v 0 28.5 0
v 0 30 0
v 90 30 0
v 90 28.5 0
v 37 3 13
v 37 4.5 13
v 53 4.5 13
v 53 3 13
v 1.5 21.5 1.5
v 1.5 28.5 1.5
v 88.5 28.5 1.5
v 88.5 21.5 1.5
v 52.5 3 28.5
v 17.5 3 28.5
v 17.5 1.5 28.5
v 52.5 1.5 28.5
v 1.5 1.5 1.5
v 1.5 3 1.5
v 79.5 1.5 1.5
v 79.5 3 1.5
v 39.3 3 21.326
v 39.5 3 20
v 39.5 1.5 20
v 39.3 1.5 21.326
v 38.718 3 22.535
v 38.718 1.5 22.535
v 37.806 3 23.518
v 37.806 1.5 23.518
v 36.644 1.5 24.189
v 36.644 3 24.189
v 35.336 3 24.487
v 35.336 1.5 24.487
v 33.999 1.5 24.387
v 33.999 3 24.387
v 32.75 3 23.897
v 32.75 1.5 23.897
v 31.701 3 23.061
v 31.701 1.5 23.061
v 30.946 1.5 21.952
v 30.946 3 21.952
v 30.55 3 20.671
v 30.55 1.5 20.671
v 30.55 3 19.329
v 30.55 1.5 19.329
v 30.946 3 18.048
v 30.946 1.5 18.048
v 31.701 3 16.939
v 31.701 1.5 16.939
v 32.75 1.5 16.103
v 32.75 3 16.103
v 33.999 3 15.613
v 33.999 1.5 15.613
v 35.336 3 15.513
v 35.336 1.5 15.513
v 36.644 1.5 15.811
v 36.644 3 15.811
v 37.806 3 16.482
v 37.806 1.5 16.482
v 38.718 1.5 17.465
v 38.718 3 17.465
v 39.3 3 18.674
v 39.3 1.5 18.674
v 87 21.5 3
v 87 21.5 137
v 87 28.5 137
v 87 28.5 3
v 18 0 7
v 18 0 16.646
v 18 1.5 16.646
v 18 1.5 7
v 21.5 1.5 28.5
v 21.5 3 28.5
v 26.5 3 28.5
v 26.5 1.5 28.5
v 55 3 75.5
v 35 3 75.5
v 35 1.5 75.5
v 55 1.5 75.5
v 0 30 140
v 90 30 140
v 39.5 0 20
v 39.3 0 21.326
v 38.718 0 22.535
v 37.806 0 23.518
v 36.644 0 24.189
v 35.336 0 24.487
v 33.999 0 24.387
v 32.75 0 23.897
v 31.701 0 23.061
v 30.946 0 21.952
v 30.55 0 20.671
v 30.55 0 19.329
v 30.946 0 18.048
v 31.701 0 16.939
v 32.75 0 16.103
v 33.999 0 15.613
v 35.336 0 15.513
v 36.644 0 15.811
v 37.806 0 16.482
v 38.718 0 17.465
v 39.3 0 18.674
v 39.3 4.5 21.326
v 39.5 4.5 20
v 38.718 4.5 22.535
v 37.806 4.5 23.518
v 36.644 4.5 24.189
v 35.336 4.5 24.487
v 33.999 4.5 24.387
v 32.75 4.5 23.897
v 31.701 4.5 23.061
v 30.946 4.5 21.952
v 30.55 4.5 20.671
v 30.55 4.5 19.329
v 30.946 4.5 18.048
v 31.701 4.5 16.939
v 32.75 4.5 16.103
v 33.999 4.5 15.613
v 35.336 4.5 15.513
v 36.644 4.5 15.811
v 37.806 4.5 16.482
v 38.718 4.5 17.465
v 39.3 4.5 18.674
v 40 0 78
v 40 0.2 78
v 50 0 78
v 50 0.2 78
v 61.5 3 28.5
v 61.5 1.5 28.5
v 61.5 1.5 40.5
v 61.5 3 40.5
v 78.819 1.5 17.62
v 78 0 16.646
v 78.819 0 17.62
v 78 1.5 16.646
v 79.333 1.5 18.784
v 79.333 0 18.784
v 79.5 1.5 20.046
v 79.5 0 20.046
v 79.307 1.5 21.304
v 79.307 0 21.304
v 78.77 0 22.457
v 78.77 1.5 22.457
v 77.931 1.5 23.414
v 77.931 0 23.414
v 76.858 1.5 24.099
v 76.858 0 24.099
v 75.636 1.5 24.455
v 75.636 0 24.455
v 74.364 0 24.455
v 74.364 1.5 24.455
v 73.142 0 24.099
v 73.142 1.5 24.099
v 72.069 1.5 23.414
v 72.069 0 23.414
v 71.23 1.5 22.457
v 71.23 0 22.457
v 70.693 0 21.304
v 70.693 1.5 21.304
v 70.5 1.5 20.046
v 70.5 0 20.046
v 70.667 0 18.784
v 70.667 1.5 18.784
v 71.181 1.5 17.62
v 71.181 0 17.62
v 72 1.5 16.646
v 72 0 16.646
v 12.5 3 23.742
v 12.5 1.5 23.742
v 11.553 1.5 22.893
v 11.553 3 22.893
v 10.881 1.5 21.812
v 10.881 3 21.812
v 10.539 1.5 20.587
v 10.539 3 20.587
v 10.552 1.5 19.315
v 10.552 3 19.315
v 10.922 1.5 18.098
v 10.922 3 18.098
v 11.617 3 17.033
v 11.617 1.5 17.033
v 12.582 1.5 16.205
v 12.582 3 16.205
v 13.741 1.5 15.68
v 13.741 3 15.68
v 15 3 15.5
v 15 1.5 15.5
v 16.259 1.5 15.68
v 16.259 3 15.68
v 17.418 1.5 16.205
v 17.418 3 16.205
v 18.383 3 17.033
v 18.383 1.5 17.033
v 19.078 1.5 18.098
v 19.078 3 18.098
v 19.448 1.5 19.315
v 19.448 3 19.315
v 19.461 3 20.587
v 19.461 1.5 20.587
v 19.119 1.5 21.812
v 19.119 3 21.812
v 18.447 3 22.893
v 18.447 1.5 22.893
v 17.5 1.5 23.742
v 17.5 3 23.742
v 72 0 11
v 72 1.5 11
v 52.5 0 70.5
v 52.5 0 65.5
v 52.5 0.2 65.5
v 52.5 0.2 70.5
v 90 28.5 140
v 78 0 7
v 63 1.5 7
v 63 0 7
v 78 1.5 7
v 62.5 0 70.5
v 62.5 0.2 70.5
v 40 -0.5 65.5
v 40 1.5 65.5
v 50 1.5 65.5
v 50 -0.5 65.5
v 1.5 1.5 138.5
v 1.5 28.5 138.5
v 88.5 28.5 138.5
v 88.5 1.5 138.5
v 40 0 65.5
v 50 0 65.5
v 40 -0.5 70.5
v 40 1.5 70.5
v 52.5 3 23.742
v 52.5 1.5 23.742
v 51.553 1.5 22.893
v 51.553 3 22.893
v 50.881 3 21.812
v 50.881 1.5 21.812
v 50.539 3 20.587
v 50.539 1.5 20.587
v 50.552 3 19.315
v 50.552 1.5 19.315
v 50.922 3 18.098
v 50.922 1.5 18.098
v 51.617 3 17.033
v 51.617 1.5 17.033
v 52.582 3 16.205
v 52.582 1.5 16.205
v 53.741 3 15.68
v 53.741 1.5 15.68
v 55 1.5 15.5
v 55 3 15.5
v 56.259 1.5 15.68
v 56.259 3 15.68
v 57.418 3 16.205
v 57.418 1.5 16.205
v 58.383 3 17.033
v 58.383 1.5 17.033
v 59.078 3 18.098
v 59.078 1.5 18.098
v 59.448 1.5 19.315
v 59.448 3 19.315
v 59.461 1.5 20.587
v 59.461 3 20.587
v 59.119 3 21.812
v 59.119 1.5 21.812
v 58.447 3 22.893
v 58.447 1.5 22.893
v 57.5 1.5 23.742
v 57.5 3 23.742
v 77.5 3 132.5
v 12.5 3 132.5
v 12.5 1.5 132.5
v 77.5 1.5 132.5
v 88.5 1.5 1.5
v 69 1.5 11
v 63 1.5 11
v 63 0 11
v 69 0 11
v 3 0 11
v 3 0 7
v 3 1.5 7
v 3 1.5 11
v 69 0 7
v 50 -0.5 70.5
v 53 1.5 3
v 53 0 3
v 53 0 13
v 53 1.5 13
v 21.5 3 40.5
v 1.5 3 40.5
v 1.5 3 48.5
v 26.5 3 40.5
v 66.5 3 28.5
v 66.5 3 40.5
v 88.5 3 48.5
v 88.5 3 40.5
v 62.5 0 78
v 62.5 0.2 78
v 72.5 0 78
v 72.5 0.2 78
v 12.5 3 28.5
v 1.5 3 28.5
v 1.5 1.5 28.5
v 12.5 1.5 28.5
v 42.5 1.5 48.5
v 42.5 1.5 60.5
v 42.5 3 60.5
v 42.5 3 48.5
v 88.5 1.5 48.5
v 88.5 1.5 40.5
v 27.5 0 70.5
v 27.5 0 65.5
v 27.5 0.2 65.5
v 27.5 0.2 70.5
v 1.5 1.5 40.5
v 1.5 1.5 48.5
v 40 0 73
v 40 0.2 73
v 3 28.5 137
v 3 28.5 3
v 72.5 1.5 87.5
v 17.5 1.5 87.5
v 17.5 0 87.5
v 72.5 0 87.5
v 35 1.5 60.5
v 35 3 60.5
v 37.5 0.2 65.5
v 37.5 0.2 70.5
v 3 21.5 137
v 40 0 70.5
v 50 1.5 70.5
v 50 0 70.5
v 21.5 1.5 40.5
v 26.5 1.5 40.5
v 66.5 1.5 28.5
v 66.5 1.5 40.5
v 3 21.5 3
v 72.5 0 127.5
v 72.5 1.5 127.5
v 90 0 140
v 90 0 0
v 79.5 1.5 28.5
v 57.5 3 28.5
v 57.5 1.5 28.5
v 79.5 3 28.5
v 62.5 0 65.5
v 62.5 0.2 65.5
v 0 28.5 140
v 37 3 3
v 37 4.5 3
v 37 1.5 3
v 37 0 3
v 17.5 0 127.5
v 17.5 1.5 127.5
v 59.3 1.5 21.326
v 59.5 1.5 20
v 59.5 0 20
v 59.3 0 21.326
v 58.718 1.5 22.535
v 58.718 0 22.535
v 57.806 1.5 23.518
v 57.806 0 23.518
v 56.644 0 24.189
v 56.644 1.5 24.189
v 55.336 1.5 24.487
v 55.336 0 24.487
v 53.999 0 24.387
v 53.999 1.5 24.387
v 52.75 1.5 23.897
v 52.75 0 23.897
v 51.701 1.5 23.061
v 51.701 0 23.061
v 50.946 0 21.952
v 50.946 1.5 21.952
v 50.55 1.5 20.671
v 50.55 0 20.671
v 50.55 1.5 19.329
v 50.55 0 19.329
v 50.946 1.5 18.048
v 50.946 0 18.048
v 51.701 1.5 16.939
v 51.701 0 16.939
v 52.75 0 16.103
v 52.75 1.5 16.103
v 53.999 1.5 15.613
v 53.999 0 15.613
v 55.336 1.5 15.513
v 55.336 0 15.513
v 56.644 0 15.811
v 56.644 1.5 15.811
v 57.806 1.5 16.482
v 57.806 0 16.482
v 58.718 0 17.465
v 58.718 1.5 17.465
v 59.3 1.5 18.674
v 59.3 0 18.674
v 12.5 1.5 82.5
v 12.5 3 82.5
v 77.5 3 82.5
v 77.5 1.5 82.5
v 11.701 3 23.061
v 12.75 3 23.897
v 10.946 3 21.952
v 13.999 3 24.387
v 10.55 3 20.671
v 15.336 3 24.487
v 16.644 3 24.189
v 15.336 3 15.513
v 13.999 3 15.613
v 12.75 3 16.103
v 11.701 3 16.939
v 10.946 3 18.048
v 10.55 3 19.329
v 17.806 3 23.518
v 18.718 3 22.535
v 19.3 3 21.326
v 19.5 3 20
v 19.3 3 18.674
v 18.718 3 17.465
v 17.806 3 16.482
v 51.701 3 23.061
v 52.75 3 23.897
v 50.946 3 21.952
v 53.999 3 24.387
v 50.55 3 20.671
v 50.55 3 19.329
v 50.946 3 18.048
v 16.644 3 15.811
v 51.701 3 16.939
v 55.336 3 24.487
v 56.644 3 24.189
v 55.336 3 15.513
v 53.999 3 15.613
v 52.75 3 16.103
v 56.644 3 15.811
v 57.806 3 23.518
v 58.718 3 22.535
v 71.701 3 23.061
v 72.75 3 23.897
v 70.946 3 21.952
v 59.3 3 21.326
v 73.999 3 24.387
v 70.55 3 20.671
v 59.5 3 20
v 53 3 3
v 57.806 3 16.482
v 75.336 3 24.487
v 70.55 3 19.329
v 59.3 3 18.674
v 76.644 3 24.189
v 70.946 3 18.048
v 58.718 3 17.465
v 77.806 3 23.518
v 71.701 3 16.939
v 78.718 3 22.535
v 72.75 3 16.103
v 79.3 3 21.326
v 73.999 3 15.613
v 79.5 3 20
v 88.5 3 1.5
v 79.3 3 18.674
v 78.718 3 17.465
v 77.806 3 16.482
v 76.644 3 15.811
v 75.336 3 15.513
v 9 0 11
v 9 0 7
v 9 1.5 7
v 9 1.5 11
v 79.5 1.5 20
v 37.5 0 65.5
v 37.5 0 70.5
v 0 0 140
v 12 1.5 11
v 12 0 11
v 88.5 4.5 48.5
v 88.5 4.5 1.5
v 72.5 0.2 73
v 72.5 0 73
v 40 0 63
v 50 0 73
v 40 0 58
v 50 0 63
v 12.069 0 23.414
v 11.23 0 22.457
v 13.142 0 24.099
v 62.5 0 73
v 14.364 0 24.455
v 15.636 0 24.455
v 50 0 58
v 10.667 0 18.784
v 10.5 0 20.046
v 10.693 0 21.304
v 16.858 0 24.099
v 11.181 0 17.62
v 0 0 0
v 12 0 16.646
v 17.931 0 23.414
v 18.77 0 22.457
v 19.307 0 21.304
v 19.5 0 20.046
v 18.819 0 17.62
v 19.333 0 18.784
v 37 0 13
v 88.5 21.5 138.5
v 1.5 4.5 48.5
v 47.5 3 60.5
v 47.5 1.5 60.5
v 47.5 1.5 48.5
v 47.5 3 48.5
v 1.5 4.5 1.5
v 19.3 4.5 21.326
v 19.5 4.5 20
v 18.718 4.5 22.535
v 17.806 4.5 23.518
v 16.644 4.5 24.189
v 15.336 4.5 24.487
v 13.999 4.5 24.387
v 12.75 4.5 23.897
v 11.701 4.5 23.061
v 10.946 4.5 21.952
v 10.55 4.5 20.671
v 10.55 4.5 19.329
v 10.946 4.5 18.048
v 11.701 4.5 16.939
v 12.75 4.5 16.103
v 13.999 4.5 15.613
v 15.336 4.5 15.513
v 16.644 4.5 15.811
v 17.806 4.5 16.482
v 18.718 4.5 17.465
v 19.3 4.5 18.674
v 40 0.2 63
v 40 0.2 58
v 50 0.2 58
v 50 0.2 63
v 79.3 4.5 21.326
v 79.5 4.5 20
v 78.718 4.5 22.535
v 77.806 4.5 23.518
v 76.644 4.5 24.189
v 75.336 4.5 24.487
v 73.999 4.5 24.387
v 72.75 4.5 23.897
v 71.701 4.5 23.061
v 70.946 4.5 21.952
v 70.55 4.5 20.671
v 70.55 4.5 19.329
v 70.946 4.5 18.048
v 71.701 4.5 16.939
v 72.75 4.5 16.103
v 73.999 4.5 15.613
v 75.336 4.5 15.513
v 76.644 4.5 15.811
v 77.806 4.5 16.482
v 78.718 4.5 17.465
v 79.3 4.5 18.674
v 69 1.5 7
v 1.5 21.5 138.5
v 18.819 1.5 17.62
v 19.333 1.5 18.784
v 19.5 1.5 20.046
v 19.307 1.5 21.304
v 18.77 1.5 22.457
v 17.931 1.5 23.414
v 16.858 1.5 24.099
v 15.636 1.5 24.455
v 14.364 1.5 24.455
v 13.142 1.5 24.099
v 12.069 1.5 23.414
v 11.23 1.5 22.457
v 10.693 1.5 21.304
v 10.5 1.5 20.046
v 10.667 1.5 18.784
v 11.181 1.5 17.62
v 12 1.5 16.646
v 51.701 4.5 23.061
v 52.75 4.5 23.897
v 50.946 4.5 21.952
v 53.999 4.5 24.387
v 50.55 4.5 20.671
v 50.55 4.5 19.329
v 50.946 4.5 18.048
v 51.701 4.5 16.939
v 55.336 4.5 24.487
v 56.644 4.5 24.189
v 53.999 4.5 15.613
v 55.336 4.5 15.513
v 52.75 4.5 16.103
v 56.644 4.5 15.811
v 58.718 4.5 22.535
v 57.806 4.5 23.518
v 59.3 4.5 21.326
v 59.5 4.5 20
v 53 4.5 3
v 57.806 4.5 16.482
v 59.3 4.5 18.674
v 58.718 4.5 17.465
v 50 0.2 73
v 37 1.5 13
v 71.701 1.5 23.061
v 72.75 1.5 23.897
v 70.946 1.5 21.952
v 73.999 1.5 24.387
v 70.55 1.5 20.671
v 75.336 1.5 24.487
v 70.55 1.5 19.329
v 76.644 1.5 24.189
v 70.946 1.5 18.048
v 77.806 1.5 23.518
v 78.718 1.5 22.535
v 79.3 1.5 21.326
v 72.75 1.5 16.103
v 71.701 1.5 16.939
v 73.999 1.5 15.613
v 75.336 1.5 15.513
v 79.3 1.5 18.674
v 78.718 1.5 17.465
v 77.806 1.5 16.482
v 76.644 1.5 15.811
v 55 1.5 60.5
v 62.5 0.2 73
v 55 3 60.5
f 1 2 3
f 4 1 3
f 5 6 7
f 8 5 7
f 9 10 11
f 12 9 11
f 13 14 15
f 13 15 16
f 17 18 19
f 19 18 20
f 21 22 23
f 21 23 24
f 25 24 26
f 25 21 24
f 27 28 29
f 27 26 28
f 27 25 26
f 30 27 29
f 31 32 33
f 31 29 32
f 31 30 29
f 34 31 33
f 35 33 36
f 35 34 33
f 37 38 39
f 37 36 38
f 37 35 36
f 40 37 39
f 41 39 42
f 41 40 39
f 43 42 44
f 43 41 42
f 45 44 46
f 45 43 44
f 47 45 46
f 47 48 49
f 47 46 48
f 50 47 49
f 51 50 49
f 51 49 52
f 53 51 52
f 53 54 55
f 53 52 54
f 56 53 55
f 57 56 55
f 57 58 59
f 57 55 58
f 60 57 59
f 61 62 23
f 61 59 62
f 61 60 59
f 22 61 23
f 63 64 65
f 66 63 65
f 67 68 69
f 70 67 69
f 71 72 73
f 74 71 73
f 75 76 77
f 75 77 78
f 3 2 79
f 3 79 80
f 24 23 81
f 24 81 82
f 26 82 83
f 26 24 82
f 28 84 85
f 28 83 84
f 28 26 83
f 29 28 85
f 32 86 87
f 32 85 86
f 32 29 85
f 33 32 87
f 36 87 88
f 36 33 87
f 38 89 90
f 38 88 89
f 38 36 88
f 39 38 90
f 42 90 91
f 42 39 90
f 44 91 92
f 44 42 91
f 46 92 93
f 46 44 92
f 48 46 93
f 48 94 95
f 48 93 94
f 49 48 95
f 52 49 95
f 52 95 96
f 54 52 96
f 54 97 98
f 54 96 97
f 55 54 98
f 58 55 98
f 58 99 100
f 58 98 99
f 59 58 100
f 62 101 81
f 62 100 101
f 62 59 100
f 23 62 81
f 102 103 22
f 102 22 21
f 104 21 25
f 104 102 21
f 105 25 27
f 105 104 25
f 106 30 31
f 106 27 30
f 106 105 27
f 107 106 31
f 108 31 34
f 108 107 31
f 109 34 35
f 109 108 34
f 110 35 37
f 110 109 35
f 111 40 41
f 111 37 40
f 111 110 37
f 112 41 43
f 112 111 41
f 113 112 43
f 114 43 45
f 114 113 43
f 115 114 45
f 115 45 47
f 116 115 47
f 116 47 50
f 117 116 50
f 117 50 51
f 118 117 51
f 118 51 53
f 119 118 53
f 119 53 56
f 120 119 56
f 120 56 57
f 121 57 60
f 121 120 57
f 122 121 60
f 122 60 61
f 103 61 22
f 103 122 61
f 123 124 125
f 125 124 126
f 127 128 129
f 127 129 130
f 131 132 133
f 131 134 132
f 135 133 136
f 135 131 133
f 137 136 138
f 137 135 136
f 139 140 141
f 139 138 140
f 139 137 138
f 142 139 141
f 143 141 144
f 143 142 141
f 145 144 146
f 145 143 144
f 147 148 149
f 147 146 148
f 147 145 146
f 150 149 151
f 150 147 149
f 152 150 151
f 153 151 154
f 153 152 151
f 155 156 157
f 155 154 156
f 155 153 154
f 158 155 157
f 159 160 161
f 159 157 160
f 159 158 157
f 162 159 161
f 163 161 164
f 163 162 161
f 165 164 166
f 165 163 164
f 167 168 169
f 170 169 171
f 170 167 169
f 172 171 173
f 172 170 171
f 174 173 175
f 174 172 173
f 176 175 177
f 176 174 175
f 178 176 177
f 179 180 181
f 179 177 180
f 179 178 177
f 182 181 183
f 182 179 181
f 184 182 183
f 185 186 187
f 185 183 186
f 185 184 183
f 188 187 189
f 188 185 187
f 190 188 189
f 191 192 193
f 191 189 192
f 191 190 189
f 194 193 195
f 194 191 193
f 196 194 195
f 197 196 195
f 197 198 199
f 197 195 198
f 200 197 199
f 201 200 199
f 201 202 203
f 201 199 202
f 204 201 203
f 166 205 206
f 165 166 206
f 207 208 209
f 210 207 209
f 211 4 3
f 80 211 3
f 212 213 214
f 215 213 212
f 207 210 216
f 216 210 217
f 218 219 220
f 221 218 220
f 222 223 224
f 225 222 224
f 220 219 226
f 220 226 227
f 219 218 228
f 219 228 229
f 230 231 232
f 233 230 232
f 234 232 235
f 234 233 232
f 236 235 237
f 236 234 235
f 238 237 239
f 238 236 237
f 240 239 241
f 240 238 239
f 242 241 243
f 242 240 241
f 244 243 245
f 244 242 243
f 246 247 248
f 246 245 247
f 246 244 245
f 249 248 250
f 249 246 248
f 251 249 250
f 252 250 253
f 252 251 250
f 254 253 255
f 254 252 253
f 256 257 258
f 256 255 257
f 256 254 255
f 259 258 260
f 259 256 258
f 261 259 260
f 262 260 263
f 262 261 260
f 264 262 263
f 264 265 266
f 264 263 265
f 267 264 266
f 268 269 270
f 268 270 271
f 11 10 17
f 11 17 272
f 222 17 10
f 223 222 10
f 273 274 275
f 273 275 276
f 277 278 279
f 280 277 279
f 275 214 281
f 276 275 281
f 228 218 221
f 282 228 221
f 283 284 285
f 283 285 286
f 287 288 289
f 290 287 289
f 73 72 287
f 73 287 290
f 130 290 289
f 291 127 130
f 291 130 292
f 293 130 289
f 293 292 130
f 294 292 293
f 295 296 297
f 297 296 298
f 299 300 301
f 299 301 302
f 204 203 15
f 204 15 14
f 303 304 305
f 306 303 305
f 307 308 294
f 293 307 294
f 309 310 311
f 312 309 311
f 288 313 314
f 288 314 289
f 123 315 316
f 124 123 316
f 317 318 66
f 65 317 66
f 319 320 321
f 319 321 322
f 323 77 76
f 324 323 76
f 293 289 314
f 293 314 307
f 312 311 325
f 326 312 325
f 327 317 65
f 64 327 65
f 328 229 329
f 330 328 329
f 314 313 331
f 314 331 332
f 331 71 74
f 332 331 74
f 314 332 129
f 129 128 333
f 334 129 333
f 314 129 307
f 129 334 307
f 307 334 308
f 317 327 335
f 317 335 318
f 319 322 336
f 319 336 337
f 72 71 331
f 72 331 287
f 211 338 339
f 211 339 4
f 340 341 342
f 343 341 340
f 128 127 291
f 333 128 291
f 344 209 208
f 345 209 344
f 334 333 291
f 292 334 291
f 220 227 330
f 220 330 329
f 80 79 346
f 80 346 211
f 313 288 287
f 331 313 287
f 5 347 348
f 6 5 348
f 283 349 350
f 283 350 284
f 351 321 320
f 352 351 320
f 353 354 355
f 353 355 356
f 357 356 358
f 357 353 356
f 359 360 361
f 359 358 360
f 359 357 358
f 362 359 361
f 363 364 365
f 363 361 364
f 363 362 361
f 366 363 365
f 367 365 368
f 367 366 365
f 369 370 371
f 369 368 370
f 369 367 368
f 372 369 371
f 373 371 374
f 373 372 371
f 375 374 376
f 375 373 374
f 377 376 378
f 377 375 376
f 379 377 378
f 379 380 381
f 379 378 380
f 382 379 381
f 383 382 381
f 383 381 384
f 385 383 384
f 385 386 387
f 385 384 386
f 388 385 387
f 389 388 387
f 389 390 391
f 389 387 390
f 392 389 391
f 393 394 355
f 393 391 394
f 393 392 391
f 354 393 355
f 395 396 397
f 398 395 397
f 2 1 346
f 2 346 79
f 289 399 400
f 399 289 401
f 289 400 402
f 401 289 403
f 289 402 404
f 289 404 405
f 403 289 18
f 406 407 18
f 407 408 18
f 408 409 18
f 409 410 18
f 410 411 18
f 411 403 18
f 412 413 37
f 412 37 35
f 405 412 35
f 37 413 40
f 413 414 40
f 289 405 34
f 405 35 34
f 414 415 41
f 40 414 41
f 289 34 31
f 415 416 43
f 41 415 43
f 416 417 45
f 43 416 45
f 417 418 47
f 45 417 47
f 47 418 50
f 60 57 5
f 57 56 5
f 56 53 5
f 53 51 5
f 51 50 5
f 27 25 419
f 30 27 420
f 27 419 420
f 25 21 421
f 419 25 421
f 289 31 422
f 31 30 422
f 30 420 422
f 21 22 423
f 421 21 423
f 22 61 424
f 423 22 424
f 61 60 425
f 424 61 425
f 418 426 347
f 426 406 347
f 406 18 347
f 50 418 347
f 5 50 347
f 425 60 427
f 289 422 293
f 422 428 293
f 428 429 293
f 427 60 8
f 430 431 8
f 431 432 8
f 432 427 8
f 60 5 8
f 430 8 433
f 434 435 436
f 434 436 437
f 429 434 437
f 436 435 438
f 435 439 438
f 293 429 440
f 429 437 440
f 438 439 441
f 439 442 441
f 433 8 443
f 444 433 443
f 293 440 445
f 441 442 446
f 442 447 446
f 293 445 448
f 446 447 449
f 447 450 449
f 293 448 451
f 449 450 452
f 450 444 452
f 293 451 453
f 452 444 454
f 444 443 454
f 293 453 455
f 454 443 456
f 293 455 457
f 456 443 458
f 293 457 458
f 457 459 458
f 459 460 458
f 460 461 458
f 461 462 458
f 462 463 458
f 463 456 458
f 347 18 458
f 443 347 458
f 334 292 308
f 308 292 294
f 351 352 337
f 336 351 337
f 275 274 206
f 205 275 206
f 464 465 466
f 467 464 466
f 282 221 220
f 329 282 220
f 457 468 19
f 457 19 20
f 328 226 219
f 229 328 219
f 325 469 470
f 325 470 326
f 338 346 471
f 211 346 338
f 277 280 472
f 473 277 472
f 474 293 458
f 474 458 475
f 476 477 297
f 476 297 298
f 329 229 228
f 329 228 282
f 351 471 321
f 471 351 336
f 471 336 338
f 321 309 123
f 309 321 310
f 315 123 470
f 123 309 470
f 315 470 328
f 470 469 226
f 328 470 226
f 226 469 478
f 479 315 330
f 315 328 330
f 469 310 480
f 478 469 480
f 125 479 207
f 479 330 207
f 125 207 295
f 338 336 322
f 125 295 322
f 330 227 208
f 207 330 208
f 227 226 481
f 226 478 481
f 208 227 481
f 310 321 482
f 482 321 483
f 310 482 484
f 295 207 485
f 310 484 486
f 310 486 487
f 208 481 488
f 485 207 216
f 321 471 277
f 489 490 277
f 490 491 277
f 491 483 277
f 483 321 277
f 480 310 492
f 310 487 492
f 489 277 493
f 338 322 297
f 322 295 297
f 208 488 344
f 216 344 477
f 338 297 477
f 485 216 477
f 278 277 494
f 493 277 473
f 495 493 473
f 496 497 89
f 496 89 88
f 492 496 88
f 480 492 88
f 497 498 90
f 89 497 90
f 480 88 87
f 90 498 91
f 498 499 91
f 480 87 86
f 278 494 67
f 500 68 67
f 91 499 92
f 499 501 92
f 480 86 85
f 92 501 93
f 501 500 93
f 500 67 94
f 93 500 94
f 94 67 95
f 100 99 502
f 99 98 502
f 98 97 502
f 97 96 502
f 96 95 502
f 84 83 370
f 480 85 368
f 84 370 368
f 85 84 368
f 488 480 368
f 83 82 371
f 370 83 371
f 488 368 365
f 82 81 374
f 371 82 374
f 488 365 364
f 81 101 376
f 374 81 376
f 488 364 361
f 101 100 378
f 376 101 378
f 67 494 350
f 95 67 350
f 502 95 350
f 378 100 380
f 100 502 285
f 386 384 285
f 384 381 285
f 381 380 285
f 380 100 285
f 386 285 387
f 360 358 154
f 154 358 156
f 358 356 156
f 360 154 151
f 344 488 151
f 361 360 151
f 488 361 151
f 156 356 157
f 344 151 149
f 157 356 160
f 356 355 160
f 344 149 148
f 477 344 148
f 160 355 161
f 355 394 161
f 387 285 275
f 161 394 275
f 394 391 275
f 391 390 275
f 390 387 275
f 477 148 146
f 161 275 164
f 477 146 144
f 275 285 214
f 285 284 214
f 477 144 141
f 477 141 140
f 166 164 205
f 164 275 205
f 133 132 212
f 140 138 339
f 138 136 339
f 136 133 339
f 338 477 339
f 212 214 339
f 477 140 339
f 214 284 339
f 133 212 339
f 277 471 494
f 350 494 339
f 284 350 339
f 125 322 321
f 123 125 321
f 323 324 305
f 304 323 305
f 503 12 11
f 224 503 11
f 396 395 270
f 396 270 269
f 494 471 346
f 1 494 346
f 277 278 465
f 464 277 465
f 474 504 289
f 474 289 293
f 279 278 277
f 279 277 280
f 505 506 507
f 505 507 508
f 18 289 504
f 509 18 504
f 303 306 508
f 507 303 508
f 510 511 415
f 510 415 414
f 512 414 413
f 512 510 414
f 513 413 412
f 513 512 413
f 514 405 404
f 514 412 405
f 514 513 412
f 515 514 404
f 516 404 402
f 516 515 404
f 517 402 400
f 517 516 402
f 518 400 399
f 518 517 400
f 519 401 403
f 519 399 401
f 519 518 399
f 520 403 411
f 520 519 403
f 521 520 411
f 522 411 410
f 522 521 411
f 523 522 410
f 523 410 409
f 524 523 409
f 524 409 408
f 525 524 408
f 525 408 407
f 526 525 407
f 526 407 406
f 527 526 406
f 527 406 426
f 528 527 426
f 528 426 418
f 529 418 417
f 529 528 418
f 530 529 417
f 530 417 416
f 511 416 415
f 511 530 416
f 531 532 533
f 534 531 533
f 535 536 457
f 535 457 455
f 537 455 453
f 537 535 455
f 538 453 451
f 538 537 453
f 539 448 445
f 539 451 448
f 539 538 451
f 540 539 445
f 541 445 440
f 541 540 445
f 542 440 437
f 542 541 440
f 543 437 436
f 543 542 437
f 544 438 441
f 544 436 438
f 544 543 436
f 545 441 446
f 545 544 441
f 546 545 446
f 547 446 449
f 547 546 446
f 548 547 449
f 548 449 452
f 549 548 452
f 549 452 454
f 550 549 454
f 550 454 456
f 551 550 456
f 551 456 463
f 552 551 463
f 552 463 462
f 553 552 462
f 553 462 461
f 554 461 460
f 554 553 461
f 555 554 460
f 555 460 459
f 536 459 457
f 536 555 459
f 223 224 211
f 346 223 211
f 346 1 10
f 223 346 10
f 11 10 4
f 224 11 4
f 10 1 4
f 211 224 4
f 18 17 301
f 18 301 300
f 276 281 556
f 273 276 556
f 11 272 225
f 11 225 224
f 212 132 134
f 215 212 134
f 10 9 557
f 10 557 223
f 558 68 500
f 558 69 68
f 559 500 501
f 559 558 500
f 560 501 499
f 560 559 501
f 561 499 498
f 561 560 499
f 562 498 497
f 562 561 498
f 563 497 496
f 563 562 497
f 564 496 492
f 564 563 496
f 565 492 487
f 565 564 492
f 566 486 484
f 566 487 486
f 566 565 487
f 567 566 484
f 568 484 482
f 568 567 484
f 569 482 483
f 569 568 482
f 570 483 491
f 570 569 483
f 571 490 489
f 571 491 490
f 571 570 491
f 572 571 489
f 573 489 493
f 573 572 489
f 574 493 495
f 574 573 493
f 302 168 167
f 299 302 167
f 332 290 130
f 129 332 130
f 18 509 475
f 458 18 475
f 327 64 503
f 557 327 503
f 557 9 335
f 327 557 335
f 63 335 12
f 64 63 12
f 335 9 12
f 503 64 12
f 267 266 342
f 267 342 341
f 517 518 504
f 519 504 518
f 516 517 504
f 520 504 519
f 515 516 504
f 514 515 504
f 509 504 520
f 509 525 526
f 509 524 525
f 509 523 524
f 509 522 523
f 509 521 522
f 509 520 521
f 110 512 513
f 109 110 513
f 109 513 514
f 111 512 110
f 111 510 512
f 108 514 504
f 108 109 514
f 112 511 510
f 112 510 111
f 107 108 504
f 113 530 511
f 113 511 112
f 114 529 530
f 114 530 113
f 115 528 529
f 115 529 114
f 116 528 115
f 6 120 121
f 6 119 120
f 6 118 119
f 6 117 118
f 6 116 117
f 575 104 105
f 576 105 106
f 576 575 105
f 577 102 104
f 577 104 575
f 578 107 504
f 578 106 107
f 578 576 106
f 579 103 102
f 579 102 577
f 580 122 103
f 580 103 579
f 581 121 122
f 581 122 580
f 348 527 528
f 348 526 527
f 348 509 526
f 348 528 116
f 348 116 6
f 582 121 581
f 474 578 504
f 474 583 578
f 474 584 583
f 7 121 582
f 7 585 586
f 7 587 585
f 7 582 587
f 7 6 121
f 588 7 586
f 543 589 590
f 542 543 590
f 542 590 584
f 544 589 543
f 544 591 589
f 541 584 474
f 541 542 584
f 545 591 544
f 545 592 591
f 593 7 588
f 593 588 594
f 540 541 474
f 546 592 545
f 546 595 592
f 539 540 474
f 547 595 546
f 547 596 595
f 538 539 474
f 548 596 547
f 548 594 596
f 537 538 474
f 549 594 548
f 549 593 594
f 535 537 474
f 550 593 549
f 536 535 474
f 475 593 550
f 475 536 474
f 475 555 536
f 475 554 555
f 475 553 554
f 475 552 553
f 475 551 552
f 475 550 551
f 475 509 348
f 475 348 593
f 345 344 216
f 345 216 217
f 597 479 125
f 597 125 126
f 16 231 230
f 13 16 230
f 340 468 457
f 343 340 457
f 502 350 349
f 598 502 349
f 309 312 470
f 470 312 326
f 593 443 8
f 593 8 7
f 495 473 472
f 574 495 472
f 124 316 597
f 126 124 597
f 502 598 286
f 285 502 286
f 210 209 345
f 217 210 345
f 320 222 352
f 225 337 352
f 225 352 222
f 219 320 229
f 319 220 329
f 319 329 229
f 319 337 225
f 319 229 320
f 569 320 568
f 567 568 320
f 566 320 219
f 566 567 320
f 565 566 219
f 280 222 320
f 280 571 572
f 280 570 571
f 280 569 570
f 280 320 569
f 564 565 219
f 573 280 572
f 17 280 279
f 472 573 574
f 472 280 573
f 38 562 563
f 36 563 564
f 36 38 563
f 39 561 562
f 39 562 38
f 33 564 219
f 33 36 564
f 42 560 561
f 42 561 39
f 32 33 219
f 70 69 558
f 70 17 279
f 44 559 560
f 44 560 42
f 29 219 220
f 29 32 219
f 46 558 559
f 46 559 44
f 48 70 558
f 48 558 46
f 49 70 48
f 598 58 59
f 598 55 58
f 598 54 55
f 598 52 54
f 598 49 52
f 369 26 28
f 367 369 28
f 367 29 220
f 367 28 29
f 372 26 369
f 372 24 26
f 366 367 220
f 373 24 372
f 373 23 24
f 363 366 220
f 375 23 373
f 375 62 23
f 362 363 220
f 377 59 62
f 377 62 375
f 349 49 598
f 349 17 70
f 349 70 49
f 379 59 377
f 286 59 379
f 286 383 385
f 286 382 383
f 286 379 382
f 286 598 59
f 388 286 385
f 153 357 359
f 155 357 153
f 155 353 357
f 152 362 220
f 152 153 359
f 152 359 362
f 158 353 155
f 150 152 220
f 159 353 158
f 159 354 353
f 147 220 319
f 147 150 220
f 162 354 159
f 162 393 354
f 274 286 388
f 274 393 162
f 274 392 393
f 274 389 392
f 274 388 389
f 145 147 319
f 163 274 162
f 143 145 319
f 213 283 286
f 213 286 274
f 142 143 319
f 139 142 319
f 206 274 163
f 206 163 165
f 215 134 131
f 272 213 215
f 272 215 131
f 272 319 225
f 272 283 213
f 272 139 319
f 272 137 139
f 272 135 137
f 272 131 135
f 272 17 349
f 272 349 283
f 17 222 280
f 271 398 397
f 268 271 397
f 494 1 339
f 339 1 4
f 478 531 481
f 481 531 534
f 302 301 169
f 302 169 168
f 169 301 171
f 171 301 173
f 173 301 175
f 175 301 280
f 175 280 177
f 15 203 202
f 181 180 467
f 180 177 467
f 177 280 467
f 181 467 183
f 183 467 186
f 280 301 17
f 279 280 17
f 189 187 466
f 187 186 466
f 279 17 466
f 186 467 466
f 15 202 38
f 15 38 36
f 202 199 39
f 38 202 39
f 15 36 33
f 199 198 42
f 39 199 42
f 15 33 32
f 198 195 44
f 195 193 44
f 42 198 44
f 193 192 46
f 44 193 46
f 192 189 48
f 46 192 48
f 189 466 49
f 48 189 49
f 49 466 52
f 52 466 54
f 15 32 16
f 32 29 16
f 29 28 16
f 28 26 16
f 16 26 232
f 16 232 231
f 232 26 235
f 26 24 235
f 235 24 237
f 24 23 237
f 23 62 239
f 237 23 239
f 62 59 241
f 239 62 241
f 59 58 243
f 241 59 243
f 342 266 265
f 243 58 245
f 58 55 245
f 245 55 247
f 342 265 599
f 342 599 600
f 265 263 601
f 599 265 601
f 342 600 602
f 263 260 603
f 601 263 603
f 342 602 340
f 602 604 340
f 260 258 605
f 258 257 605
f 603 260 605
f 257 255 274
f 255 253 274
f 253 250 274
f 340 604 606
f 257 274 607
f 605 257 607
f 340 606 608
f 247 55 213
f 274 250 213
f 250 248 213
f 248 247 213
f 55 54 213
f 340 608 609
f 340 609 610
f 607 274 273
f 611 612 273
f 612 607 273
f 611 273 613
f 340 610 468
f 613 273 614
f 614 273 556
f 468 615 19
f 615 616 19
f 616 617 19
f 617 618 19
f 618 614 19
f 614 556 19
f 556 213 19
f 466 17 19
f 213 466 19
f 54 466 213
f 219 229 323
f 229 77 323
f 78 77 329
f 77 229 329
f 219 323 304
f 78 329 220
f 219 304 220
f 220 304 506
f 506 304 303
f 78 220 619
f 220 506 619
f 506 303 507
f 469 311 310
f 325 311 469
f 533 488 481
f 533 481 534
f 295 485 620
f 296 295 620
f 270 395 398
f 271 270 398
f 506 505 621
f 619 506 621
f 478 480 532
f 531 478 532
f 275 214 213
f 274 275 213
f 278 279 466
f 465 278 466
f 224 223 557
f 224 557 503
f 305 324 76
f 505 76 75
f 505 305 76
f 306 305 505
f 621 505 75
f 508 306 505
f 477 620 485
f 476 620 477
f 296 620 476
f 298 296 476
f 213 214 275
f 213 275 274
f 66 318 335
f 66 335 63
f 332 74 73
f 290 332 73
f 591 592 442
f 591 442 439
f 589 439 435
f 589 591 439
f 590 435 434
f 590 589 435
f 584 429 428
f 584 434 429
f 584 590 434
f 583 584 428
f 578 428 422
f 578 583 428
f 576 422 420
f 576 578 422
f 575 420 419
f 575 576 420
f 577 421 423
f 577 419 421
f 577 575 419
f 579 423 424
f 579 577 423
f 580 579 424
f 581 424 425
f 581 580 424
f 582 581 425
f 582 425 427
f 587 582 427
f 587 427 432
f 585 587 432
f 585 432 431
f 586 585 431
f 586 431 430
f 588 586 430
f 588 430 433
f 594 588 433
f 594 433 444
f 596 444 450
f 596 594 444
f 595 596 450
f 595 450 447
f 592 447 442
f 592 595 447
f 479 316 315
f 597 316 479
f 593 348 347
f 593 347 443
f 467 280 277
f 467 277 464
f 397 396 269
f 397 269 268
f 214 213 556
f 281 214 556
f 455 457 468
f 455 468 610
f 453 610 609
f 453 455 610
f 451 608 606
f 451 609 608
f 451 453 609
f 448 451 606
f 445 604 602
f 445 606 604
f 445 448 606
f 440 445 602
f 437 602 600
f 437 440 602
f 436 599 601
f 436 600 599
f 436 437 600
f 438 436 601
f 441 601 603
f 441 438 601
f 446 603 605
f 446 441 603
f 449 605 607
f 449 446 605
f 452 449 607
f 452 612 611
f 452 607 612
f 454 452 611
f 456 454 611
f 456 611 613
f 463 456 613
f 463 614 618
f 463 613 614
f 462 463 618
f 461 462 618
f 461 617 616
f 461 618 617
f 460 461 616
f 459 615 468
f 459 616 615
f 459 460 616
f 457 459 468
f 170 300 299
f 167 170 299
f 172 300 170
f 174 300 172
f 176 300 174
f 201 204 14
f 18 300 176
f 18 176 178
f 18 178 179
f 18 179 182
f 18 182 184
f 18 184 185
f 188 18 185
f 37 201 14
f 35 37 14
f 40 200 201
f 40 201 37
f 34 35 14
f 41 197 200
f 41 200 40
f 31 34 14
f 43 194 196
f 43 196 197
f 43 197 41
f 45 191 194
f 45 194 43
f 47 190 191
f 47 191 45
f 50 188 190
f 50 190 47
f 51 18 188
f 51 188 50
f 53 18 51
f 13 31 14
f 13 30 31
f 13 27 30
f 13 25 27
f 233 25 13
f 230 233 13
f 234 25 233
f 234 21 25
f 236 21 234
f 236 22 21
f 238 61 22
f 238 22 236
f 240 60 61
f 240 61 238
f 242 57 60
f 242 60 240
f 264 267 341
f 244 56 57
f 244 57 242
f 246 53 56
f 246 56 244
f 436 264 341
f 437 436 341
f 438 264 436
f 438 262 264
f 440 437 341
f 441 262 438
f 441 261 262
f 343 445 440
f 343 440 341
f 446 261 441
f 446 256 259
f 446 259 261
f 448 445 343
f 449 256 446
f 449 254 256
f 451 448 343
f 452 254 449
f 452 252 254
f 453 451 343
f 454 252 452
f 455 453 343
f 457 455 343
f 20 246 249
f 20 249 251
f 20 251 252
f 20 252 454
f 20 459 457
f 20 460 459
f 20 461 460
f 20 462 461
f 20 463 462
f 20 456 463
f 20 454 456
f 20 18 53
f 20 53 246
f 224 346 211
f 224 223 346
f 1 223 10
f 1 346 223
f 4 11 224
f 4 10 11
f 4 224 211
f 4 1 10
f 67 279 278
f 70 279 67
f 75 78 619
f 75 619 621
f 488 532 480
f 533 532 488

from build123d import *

# Parameters (mm, degrees)
BOX011_W               = 65
BOX011_H               = 1.5
BOX011_DEPTH           = 50
BOX008_W               = 1.5
BOX008_H               = 7
BOX008_DEPTH           = 137
BOX007_W               = 90
BOX007_H               = 1.5
BOX007_DEPTH           = 140
BOX009_W               = 84
BOX009_H               = 7
BOX009_DEPTH           = 1.5
BOX006_W               = 1.5
BOX006_H               = 7
BOX006_DEPTH           = 137
BOX005_W               = 84
BOX005_H               = 7
BOX005_DEPTH           = 1.5
CYLINDER008_R          = 4.5
CYLINDER008_DEPTH      = 10
CYLINDER008_ROLL_ANGLE = 90
CYLINDER010_R          = 4.5
CYLINDER010_DEPTH      = 10
CYLINDER010_ROLL_ANGLE = 90
CYLINDER009_R          = 4.5
CYLINDER009_DEPTH      = 10
CYLINDER009_ROLL_ANGLE = 90
CYLINDER011_R          = 4.5
CYLINDER011_DEPTH      = 10
CYLINDER011_ROLL_ANGLE = 90
BOX023_W               = 16
BOX023_H               = 10
BOX023_DEPTH           = 10
BOX021_W               = 87
BOX021_H               = 1.5
BOX021_DEPTH           = 47
BOX028_W               = 6
BOX028_H               = 1.5
BOX028_DEPTH           = 4
BOX031_W               = 6
BOX031_H               = 1.5
BOX031_DEPTH           = 4
BOX027_W               = 5
BOX027_H               = 1.5
BOX027_DEPTH           = 12
BOX025_W               = 5
BOX025_H               = 1.5
BOX025_DEPTH           = 12
CYLINDER002_R          = 4.5
CYLINDER002_DEPTH      = 10
CYLINDER002_ROLL_ANGLE = 90
CYLINDER001_R          = 4.5
CYLINDER001_DEPTH      = 10
CYLINDER001_ROLL_ANGLE = 90
CYLINDER003_R          = 4.5
CYLINDER003_DEPTH      = 10
CYLINDER003_ROLL_ANGLE = 90
CYLINDER_R             = 4.5
CYLINDER_DEPTH         = 10
CYLINDER_ROLL_ANGLE    = 90
BOX012_W               = 78
BOX012_H               = 1.5
BOX012_DEPTH           = 27
BOX041_W               = 5
BOX041_H               = 1.5
BOX041_DEPTH           = 12
BOX040_W               = 20
BOX040_H               = 1.5
BOX040_DEPTH           = 15
BOX039_W               = 10
BOX039_H               = 2
BOX039_DEPTH           = 5
BOX026_W               = 5
BOX026_H               = 1.5
BOX026_DEPTH           = 12
BOX024_W               = 5
BOX024_H               = 1.5
BOX024_DEPTH           = 12
BOX017_W               = 87
BOX017_H               = 1.5
BOX017_DEPTH           = 8
BOX034_W               = 10
BOX034_H               = 0.2
BOX034_DEPTH           = 5
BOX035_W               = 10
BOX035_H               = 0.2
BOX035_DEPTH           = 5
BOX036_W               = 10
BOX036_H               = 0.2
BOX036_DEPTH           = 5
BOX037_W               = 10
BOX037_H               = 0.2
BOX037_DEPTH           = 5
BOX038_W               = 10
BOX038_H               = 1.5
BOX038_DEPTH           = 5
BOX042_W               = 10
BOX042_H               = 0.2
BOX042_DEPTH           = 5
BOX033_W               = 6
BOX033_H               = 1.5
BOX033_DEPTH           = 12
BOX032_W               = 15
BOX032_H               = 1.5
BOX032_DEPTH           = 4
BOX030_W               = 6
BOX030_H               = 1.5
BOX030_DEPTH           = 12
BOX029_W               = 15
BOX029_H               = 1.5
BOX029_DEPTH           = 4
BOX_W                  = 1.5
BOX_H                  = 27
BOX_DEPTH              = 140
BOX002_W               = 87
BOX002_H               = 27
BOX002_DEPTH           = 1.5
BOX001_W               = 1.5
BOX001_H               = 27
BOX001_DEPTH           = 140
CYLINDER004_R          = 4.5
CYLINDER004_DEPTH      = 10
CYLINDER004_ROLL_ANGLE = 90
CYLINDER006_R          = 4.5
CYLINDER006_DEPTH      = 10
CYLINDER006_ROLL_ANGLE = 90
CYLINDER005_R          = 4.5
CYLINDER005_DEPTH      = 10
CYLINDER005_ROLL_ANGLE = 90
CYLINDER007_R          = 4.5
CYLINDER007_DEPTH      = 10
CYLINDER007_ROLL_ANGLE = 90
BOX020_W               = 16
BOX020_H               = 10
BOX020_DEPTH           = 10
BOX019_W               = 55
BOX019_H               = 1.5
BOX019_DEPTH           = 40
BOX018_W               = 90
BOX018_H               = 1.5
BOX018_DEPTH           = 140
BOX004_W               = 87
BOX004_H               = 27
BOX004_DEPTH           = 1.5


with BuildPart() as cube011:
    # Box011 → Box011 (new body)
    with BuildSketch(Plane(origin=(12.5, 1.5, 82.5), x_dir=(1, 0, 0), z_dir=(0, 0, 1))):
        with Locations((32.5, 0.75)):
            Rectangle(BOX011_W, BOX011_H)
    extrude(amount=BOX011_DEPTH)


with BuildPart() as cube008:
    # Box008 → Box008 (new body)
    with BuildSketch(Plane(origin=(87, 21.5, 1.5), x_dir=(1, 0, 0), z_dir=(0, 0, 1))):
        with Locations((0.75, 3.5)):
            Rectangle(BOX008_W, BOX008_H)
    extrude(amount=BOX008_DEPTH)


with BuildPart() as cube007:
    # Box007 → Box007 (new body)
    with BuildSketch(Plane(origin=(0, 28.5, 0), x_dir=(1, 0, 0), z_dir=(0, 0, 1))):
        with Locations((45, 0.75)):
            Rectangle(BOX007_W, BOX007_H)
    extrude(amount=BOX007_DEPTH)


with BuildPart() as cube009:
    # Box009 → Box009 (new body)
    with BuildSketch(Plane(origin=(3, 21.5, 1.5), x_dir=(1, 0, 0), z_dir=(0, 0, 1))):
        with Locations((42, 3.5)):
            Rectangle(BOX009_W, BOX009_H)
    extrude(amount=BOX009_DEPTH)


with BuildPart() as cube006:
    # Box006 → Box006 (new body)
    with BuildSketch(Plane(origin=(1.5, 21.5, 1.5), x_dir=(1, 0, 0), z_dir=(0, 0, 1))):
        with Locations((0.75, 3.5)):
            Rectangle(BOX006_W, BOX006_H)
    extrude(amount=BOX006_DEPTH)


with BuildPart() as fusion001:
    # Box005 → Box005 (new body)
    with BuildSketch(Plane(origin=(3, 21.5, 137), x_dir=(1, 0, 0), z_dir=(0, 0, 1))):
        with Locations((42, 3.5)):
            Rectangle(BOX005_W, BOX005_H)
    extrude(amount=BOX005_DEPTH)

    # Fusion001: union Cube008, Cube007, Cube009, Cube006
    add(cube008.part)
    add(cube007.part)
    add(cube009.part)
    add(cube006.part)


with BuildPart() as cylinder008:
    # Cylinder008 → Cylinder008 (new body)
    with BuildSketch(Plane.XY):
        Circle(CYLINDER008_R)
    extrude(amount=CYLINDER008_DEPTH)


with BuildPart() as cylinder008_1:
    # Cylinder008 roll: moved
    add(cylinder008.part.rotate(Axis((0, 0, 0), (1, 0, 0)), CYLINDER008_ROLL_ANGLE))


with BuildPart() as cylinder008_2:
    # Cylinder008 placement: moved
    add(cylinder008_1.part.moved(Location((15, 5, 20))))


with BuildPart() as cylinder010:
    # Cylinder010 → Cylinder010 (new body)
    with BuildSketch(Plane.XY):
        Circle(CYLINDER010_R)
    extrude(amount=CYLINDER010_DEPTH)


with BuildPart() as cylinder010_1:
    # Cylinder010 roll: moved
    add(cylinder010.part.rotate(Axis((0, 0, 0), (1, 0, 0)), CYLINDER010_ROLL_ANGLE))


with BuildPart() as cylinder010_2:
    # Cylinder010 placement: moved
    add(cylinder010_1.part.moved(Location((35, 5, 20))))


with BuildPart() as cylinder009:
    # Cylinder009 → Cylinder009 (new body)
    with BuildSketch(Plane.XY):
        Circle(CYLINDER009_R)
    extrude(amount=CYLINDER009_DEPTH)


with BuildPart() as cylinder009_1:
    # Cylinder009 roll: moved
    add(cylinder009.part.rotate(Axis((0, 0, 0), (1, 0, 0)), CYLINDER009_ROLL_ANGLE))


with BuildPart() as cylinder009_2:
    # Cylinder009 placement: moved
    add(cylinder009_1.part.moved(Location((55, 5, 20))))


with BuildPart() as cylinder011:
    # Cylinder011 → Cylinder011 (new body)
    with BuildSketch(Plane.XY):
        Circle(CYLINDER011_R)
    extrude(amount=CYLINDER011_DEPTH)


with BuildPart() as cylinder011_1:
    # Cylinder011 roll: moved
    add(cylinder011.part.rotate(Axis((0, 0, 0), (1, 0, 0)), CYLINDER011_ROLL_ANGLE))


with BuildPart() as cylinder011_2:
    # Cylinder011 placement: moved
    add(cylinder011_1.part.moved(Location((75, 5, 20))))


with BuildPart() as fusion004:
    # Box023 → Box023 (new body)
    with BuildSketch(Plane(origin=(37, -5, 3), x_dir=(1, 0, 0), z_dir=(0, 0, 1))):
        with Locations((8, 5)):
            Rectangle(BOX023_W, BOX023_H)
    extrude(amount=BOX023_DEPTH)

    # Fusion004: union Cylinder008, Cylinder010, Cylinder009, Cylinder011
    add(cylinder008_2.part)
    add(cylinder010_2.part)
    add(cylinder009_2.part)
    add(cylinder011_2.part)


with BuildPart() as cut:
    # Box021 → Box021 (new body)
    with BuildSketch(Plane(origin=(1.5, 3, 1.5), x_dir=(1, 0, 0), z_dir=(0, 0, 1))):
        with Locations((43.5, 0.75)):
            Rectangle(BOX021_W, BOX021_H)
    extrude(amount=BOX021_DEPTH)

    # Cut: cut Fusion004
    add(fusion004.part, mode=Mode.SUBTRACT)


with BuildPart() as cube028:
    # Box028 → Box028 (new body)
    with BuildSketch(Plane(origin=(3, 0, 7), x_dir=(1, 0, 0), z_dir=(0, 0, 1))):
        with Locations((3, 0.75)):
            Rectangle(BOX028_W, BOX028_H)
    extrude(amount=BOX028_DEPTH)


with BuildPart() as cube031:
    # Box031 → Box031 (new body)
    with BuildSketch(Plane(origin=(63, 0, 7), x_dir=(1, 0, 0), z_dir=(0, 0, 1))):
        with Locations((3, 0.75)):
            Rectangle(BOX031_W, BOX031_H)
    extrude(amount=BOX031_DEPTH)


with BuildPart() as cube027:
    # Box027 → Box027 (new body)
    with BuildSketch(Plane(origin=(12.5, 1.5, 16.5), x_dir=(1, 0, 0), z_dir=(0, 0, 1))):
        with Locations((2.5, 0.75)):
            Rectangle(BOX027_W, BOX027_H)
    extrude(amount=BOX027_DEPTH)


with BuildPart() as cube025:
    # Box025 → Box025 (new body)
    with BuildSketch(Plane(origin=(52.5, 1.5, 16.5), x_dir=(1, 0, 0), z_dir=(0, 0, 1))):
        with Locations((2.5, 0.75)):
            Rectangle(BOX025_W, BOX025_H)
    extrude(amount=BOX025_DEPTH)


with BuildPart() as cylinder002:
    # Cylinder002 → Cylinder002 (new body)
    with BuildSketch(Plane.XY):
        Circle(CYLINDER002_R)
    extrude(amount=CYLINDER002_DEPTH)


with BuildPart() as cylinder002_1:
    # Cylinder002 roll: moved
    add(cylinder002.part.rotate(Axis((0, 0, 0), (1, 0, 0)), CYLINDER002_ROLL_ANGLE))


with BuildPart() as cylinder002_2:
    # Cylinder002 placement: moved
    add(cylinder002_1.part.moved(Location((35, 5, 20))))


with BuildPart() as cylinder001:
    # Cylinder001 → Cylinder001 (new body)
    with BuildSketch(Plane.XY):
        Circle(CYLINDER001_R)
    extrude(amount=CYLINDER001_DEPTH)


with BuildPart() as cylinder001_1:
    # Cylinder001 roll: moved
    add(cylinder001.part.rotate(Axis((0, 0, 0), (1, 0, 0)), CYLINDER001_ROLL_ANGLE))


with BuildPart() as cylinder001_2:
    # Cylinder001 placement: moved
    add(cylinder001_1.part.moved(Location((55, 5, 20))))


with BuildPart() as cylinder003:
    # Cylinder003 → Cylinder003 (new body)
    with BuildSketch(Plane.XY):
        Circle(CYLINDER003_R)
    extrude(amount=CYLINDER003_DEPTH)


with BuildPart() as cylinder003_1:
    # Cylinder003 roll: moved
    add(cylinder003.part.rotate(Axis((0, 0, 0), (1, 0, 0)), CYLINDER003_ROLL_ANGLE))


with BuildPart() as cylinder003_2:
    # Cylinder003 placement: moved
    add(cylinder003_1.part.moved(Location((75, 5, 20))))


with BuildPart() as fusion002:
    # Cylinder → Cylinder (new body)
    with BuildSketch(Plane.XY):
        Circle(CYLINDER_R)
    extrude(amount=CYLINDER_DEPTH)


with BuildPart() as fusion002_1:
    # Cylinder roll: moved
    add(fusion002.part.rotate(Axis((0, 0, 0), (1, 0, 0)), CYLINDER_ROLL_ANGLE))


with BuildPart() as fusion002_2:
    # Cylinder placement: moved
    add(fusion002_1.part.moved(Location((15, 5, 20))))

    # Fusion002: union Cylinder002, Cylinder001, Cylinder003
    add(cylinder002_2.part)
    add(cylinder001_2.part)
    add(cylinder003_2.part)


with BuildPart() as fusion008:
    # Box012 → Box012 (new body)
    with BuildSketch(Plane(origin=(1.5, 1.5, 1.5), x_dir=(1, 0, 0), z_dir=(0, 0, 1))):
        with Locations((39, 0.75)):
            Rectangle(BOX012_W, BOX012_H)
    extrude(amount=BOX012_DEPTH)

    # Cut002: cut Fusion002
    add(fusion002_2.part, mode=Mode.SUBTRACT)

    # Cut005: cut Cube025
    add(cube025.part, mode=Mode.SUBTRACT)

    # Cut006: cut Cube027
    add(cube027.part, mode=Mode.SUBTRACT)

    # Fusion008: union Cube028, Cube031
    add(cube028.part)
    add(cube031.part)


with BuildPart() as cube041:
    # Box041 → Box041 (new body)
    with BuildSketch(Plane(origin=(42.5, 1.5, 48.5), x_dir=(1, 0, 0), z_dir=(0, 0, 1))):
        with Locations((2.5, 0.75)):
            Rectangle(BOX041_W, BOX041_H)
    extrude(amount=BOX041_DEPTH)


with BuildPart() as cube040:
    # Box040 → Box040 (new body)
    with BuildSketch(Plane(origin=(35, 1.5, 60.5), x_dir=(1, 0, 0), z_dir=(0, 0, 1))):
        with Locations((10, 0.75)):
            Rectangle(BOX040_W, BOX040_H)
    extrude(amount=BOX040_DEPTH)


with BuildPart() as fusion010:
    # Box039 → Box039 (new body)
    with BuildSketch(Plane(origin=(40, -0.5, 65.5), x_dir=(1, 0, 0), z_dir=(0, 0, 1))):
        with Locations((5, 1)):
            Rectangle(BOX039_W, BOX039_H)
    extrude(amount=BOX039_DEPTH)

    # Fusion010: union Cube041, Cube040
    add(cube041.part)
    add(cube040.part)


with BuildPart() as cube026:
    # Box026 → Box026 (new body)
    with BuildSketch(Plane(origin=(61.5, 1.5, 28.5), x_dir=(1, 0, 0), z_dir=(0, 0, 1))):
        with Locations((2.5, 0.75)):
            Rectangle(BOX026_W, BOX026_H)
    extrude(amount=BOX026_DEPTH)


with BuildPart() as cube024:
    # Box024 → Box024 (new body)
    with BuildSketch(Plane(origin=(21.5, 1.5, 28.5), x_dir=(1, 0, 0), z_dir=(0, 0, 1))):
        with Locations((2.5, 0.75)):
            Rectangle(BOX024_W, BOX024_H)
    extrude(amount=BOX024_DEPTH)


with BuildPart() as fusion011:
    # Box017 → Box017 (new body)
    with BuildSketch(Plane(origin=(1.5, 1.5, 40.5), x_dir=(1, 0, 0), z_dir=(0, 0, 1))):
        with Locations((43.5, 0.75)):
            Rectangle(BOX017_W, BOX017_H)
    extrude(amount=BOX017_DEPTH)

    # Fusion011: union Cube026, Cube024
    add(cube026.part)
    add(cube024.part)


with BuildPart() as cube034:
    # Box034 → Box034 (new body)
    with BuildSketch(Plane(origin=(40, 0, 58), x_dir=(1, 0, 0), z_dir=(0, 0, 1))):
        with Locations((5, 0.1)):
            Rectangle(BOX034_W, BOX034_H)
    extrude(amount=BOX034_DEPTH)


with BuildPart() as cube035:
    # Box035 → Box035 (new body)
    with BuildSketch(Plane(origin=(40, 0, 73), x_dir=(1, 0, 0), z_dir=(0, 0, 1))):
        with Locations((5, 0.1)):
            Rectangle(BOX035_W, BOX035_H)
    extrude(amount=BOX035_DEPTH)


with BuildPart() as cube036:
    # Box036 → Box036 (new body)
    with BuildSketch(Plane(origin=(27.5, 0, 65.5), x_dir=(1, 0, 0), z_dir=(0, 0, 1))):
        with Locations((5, 0.1)):
            Rectangle(BOX036_W, BOX036_H)
    extrude(amount=BOX036_DEPTH)


with BuildPart() as cube037:
    # Box037 → Box037 (new body)
    with BuildSketch(Plane(origin=(52.5, 0, 65.5), x_dir=(1, 0, 0), z_dir=(0, 0, 1))):
        with Locations((5, 0.1)):
            Rectangle(BOX037_W, BOX037_H)
    extrude(amount=BOX037_DEPTH)


with BuildPart() as cube038:
    # Box038 → Box038 (new body)
    with BuildSketch(Plane(origin=(40, 0, 65.5), x_dir=(1, 0, 0), z_dir=(0, 0, 1))):
        with Locations((5, 0.75)):
            Rectangle(BOX038_W, BOX038_H)
    extrude(amount=BOX038_DEPTH)


with BuildPart() as fusion012:
    # Box042 → Box042 (new body)
    with BuildSketch(Plane(origin=(62.5, 0, 73), x_dir=(1, 0, 0), z_dir=(0, 0, 1))):
        with Locations((5, 0.1)):
            Rectangle(BOX042_W, BOX042_H)
    extrude(amount=BOX042_DEPTH)

    # Fusion012: union Cube034, Cube035, Cube036, Cube037, Cube038
    add(cube034.part)
    add(cube035.part)
    add(cube036.part)
    add(cube037.part)
    add(cube038.part)


with BuildPart() as cube033:
    # Box033 → Box033 (new body)
    with BuildSketch(Plane(origin=(72, 0, 11), x_dir=(1, 0, 0), z_dir=(0, 0, 1))):
        with Locations((3, 0.75)):
            Rectangle(BOX033_W, BOX033_H)
    extrude(amount=BOX033_DEPTH)


with BuildPart() as fusion006:
    # Box032 → Box032 (new body)
    with BuildSketch(Plane(origin=(63, 0, 7), x_dir=(1, 0, 0), z_dir=(0, 0, 1))):
        with Locations((7.5, 0.75)):
            Rectangle(BOX032_W, BOX032_H)
    extrude(amount=BOX032_DEPTH)

    # Fusion006: union Cube033
    add(cube033.part)


with BuildPart() as cube030:
    # Box030 → Box030 (new body)
    with BuildSketch(Plane(origin=(12, 0, 11), x_dir=(1, 0, 0), z_dir=(0, 0, 1))):
        with Locations((3, 0.75)):
            Rectangle(BOX030_W, BOX030_H)
    extrude(amount=BOX030_DEPTH)


with BuildPart() as fusion007:
    # Box029 → Box029 (new body)
    with BuildSketch(Plane(origin=(3, 0, 7), x_dir=(1, 0, 0), z_dir=(0, 0, 1))):
        with Locations((7.5, 0.75)):
            Rectangle(BOX029_W, BOX029_H)
    extrude(amount=BOX029_DEPTH)

    # Fusion005: union Cube030
    add(cube030.part)

    # Fusion007: union Fusion006
    add(fusion006.part)


with BuildPart() as cube:
    # Box → Box (new body)
    with BuildSketch(Plane(origin=(0, 1.5, 0), x_dir=(1, 0, 0), z_dir=(0, 0, 1))):
        with Locations((0.75, 13.5)):
            Rectangle(BOX_W, BOX_H)
    extrude(amount=BOX_DEPTH)


with BuildPart() as cube002:
    # Box002 → Box002 (new body)
    with BuildSketch(Plane(origin=(1.5, 1.5, 0), x_dir=(1, 0, 0), z_dir=(0, 0, 1))):
        with Locations((43.5, 13.5)):
            Rectangle(BOX002_W, BOX002_H)
    extrude(amount=BOX002_DEPTH)


with BuildPart() as cube001:
    # Box001 → Box001 (new body)
    with BuildSketch(Plane(origin=(88.5, 1.5, 0), x_dir=(1, 0, 0), z_dir=(0, 0, 1))):
        with Locations((0.75, 13.5)):
            Rectangle(BOX001_W, BOX001_H)
    extrude(amount=BOX001_DEPTH)


with BuildPart() as cylinder004:
    # Cylinder004 → Cylinder004 (new body)
    with BuildSketch(Plane.XY):
        Circle(CYLINDER004_R)
    extrude(amount=CYLINDER004_DEPTH)


with BuildPart() as cylinder004_1:
    # Cylinder004 roll: moved
    add(cylinder004.part.rotate(Axis((0, 0, 0), (1, 0, 0)), CYLINDER004_ROLL_ANGLE))


with BuildPart() as cylinder004_2:
    # Cylinder004 placement: moved
    add(cylinder004_1.part.moved(Location((15, 5, 20))))


with BuildPart() as cylinder006:
    # Cylinder006 → Cylinder006 (new body)
    with BuildSketch(Plane.XY):
        Circle(CYLINDER006_R)
    extrude(amount=CYLINDER006_DEPTH)


with BuildPart() as cylinder006_1:
    # Cylinder006 roll: moved
    add(cylinder006.part.rotate(Axis((0, 0, 0), (1, 0, 0)), CYLINDER006_ROLL_ANGLE))


with BuildPart() as cylinder006_2:
    # Cylinder006 placement: moved
    add(cylinder006_1.part.moved(Location((35, 5, 20))))


with BuildPart() as cylinder005:
    # Cylinder005 → Cylinder005 (new body)
    with BuildSketch(Plane.XY):
        Circle(CYLINDER005_R)
    extrude(amount=CYLINDER005_DEPTH)


with BuildPart() as cylinder005_1:
    # Cylinder005 roll: moved
    add(cylinder005.part.rotate(Axis((0, 0, 0), (1, 0, 0)), CYLINDER005_ROLL_ANGLE))


with BuildPart() as cylinder005_2:
    # Cylinder005 placement: moved
    add(cylinder005_1.part.moved(Location((55, 5, 20))))


with BuildPart() as cylinder007:
    # Cylinder007 → Cylinder007 (new body)
    with BuildSketch(Plane.XY):
        Circle(CYLINDER007_R)
    extrude(amount=CYLINDER007_DEPTH)


with BuildPart() as cylinder007_1:
    # Cylinder007 roll: moved
    add(cylinder007.part.rotate(Axis((0, 0, 0), (1, 0, 0)), CYLINDER007_ROLL_ANGLE))


with BuildPart() as cylinder007_2:
    # Cylinder007 placement: moved
    add(cylinder007_1.part.moved(Location((75, 5, 20))))


with BuildPart() as fusion003:
    # Box020 → Box020 (new body)
    with BuildSketch(Plane(origin=(37, -5, 3), x_dir=(1, 0, 0), z_dir=(0, 0, 1))):
        with Locations((8, 5)):
            Rectangle(BOX020_W, BOX020_H)
    extrude(amount=BOX020_DEPTH)

    # Fusion003: union Cylinder004, Cylinder006, Cylinder005, Cylinder007
    add(cylinder004_2.part)
    add(cylinder006_2.part)
    add(cylinder005_2.part)
    add(cylinder007_2.part)


with BuildPart() as cube019:
    # Box019 → Box019 (new body)
    with BuildSketch(Plane(origin=(17.5, 0, 87.5), x_dir=(1, 0, 0), z_dir=(0, 0, 1))):
        with Locations((27.5, 0.75)):
            Rectangle(BOX019_W, BOX019_H)
    extrude(amount=BOX019_DEPTH)


with BuildPart() as cut004:
    # Box018 → Box018 (new body)
    with BuildSketch(Plane.XY):
        with Locations((45, 0.75)):
            Rectangle(BOX018_W, BOX018_H)
    extrude(amount=BOX018_DEPTH)

    # Cut003: cut Cube019
    add(cube019.part, mode=Mode.SUBTRACT)

    # Cut004: cut Fusion003
    add(fusion003.part, mode=Mode.SUBTRACT)


with BuildPart() as cut008:
    # Box004 → Box004 (new body)
    with BuildSketch(Plane(origin=(1.5, 1.5, 138.5), x_dir=(1, 0, 0), z_dir=(0, 0, 1))):
        with Locations((43.5, 13.5)):
            Rectangle(BOX004_W, BOX004_H)
    extrude(amount=BOX004_DEPTH)

    # Fusion: union Cube, Cube002, Cube001, Cut004
    add(cube.part)
    add(cube002.part)
    add(cube001.part)
    add(cut004.part)

    # Cut007: cut Fusion007
    add(fusion007.part, mode=Mode.SUBTRACT)

    # Cut008: cut Fusion012
    add(fusion012.part, mode=Mode.SUBTRACT)


solid = Compound([cube011.part, fusion001.part, cut.part, fusion008.part, fusion010.part, fusion011.part, cut008.part])
